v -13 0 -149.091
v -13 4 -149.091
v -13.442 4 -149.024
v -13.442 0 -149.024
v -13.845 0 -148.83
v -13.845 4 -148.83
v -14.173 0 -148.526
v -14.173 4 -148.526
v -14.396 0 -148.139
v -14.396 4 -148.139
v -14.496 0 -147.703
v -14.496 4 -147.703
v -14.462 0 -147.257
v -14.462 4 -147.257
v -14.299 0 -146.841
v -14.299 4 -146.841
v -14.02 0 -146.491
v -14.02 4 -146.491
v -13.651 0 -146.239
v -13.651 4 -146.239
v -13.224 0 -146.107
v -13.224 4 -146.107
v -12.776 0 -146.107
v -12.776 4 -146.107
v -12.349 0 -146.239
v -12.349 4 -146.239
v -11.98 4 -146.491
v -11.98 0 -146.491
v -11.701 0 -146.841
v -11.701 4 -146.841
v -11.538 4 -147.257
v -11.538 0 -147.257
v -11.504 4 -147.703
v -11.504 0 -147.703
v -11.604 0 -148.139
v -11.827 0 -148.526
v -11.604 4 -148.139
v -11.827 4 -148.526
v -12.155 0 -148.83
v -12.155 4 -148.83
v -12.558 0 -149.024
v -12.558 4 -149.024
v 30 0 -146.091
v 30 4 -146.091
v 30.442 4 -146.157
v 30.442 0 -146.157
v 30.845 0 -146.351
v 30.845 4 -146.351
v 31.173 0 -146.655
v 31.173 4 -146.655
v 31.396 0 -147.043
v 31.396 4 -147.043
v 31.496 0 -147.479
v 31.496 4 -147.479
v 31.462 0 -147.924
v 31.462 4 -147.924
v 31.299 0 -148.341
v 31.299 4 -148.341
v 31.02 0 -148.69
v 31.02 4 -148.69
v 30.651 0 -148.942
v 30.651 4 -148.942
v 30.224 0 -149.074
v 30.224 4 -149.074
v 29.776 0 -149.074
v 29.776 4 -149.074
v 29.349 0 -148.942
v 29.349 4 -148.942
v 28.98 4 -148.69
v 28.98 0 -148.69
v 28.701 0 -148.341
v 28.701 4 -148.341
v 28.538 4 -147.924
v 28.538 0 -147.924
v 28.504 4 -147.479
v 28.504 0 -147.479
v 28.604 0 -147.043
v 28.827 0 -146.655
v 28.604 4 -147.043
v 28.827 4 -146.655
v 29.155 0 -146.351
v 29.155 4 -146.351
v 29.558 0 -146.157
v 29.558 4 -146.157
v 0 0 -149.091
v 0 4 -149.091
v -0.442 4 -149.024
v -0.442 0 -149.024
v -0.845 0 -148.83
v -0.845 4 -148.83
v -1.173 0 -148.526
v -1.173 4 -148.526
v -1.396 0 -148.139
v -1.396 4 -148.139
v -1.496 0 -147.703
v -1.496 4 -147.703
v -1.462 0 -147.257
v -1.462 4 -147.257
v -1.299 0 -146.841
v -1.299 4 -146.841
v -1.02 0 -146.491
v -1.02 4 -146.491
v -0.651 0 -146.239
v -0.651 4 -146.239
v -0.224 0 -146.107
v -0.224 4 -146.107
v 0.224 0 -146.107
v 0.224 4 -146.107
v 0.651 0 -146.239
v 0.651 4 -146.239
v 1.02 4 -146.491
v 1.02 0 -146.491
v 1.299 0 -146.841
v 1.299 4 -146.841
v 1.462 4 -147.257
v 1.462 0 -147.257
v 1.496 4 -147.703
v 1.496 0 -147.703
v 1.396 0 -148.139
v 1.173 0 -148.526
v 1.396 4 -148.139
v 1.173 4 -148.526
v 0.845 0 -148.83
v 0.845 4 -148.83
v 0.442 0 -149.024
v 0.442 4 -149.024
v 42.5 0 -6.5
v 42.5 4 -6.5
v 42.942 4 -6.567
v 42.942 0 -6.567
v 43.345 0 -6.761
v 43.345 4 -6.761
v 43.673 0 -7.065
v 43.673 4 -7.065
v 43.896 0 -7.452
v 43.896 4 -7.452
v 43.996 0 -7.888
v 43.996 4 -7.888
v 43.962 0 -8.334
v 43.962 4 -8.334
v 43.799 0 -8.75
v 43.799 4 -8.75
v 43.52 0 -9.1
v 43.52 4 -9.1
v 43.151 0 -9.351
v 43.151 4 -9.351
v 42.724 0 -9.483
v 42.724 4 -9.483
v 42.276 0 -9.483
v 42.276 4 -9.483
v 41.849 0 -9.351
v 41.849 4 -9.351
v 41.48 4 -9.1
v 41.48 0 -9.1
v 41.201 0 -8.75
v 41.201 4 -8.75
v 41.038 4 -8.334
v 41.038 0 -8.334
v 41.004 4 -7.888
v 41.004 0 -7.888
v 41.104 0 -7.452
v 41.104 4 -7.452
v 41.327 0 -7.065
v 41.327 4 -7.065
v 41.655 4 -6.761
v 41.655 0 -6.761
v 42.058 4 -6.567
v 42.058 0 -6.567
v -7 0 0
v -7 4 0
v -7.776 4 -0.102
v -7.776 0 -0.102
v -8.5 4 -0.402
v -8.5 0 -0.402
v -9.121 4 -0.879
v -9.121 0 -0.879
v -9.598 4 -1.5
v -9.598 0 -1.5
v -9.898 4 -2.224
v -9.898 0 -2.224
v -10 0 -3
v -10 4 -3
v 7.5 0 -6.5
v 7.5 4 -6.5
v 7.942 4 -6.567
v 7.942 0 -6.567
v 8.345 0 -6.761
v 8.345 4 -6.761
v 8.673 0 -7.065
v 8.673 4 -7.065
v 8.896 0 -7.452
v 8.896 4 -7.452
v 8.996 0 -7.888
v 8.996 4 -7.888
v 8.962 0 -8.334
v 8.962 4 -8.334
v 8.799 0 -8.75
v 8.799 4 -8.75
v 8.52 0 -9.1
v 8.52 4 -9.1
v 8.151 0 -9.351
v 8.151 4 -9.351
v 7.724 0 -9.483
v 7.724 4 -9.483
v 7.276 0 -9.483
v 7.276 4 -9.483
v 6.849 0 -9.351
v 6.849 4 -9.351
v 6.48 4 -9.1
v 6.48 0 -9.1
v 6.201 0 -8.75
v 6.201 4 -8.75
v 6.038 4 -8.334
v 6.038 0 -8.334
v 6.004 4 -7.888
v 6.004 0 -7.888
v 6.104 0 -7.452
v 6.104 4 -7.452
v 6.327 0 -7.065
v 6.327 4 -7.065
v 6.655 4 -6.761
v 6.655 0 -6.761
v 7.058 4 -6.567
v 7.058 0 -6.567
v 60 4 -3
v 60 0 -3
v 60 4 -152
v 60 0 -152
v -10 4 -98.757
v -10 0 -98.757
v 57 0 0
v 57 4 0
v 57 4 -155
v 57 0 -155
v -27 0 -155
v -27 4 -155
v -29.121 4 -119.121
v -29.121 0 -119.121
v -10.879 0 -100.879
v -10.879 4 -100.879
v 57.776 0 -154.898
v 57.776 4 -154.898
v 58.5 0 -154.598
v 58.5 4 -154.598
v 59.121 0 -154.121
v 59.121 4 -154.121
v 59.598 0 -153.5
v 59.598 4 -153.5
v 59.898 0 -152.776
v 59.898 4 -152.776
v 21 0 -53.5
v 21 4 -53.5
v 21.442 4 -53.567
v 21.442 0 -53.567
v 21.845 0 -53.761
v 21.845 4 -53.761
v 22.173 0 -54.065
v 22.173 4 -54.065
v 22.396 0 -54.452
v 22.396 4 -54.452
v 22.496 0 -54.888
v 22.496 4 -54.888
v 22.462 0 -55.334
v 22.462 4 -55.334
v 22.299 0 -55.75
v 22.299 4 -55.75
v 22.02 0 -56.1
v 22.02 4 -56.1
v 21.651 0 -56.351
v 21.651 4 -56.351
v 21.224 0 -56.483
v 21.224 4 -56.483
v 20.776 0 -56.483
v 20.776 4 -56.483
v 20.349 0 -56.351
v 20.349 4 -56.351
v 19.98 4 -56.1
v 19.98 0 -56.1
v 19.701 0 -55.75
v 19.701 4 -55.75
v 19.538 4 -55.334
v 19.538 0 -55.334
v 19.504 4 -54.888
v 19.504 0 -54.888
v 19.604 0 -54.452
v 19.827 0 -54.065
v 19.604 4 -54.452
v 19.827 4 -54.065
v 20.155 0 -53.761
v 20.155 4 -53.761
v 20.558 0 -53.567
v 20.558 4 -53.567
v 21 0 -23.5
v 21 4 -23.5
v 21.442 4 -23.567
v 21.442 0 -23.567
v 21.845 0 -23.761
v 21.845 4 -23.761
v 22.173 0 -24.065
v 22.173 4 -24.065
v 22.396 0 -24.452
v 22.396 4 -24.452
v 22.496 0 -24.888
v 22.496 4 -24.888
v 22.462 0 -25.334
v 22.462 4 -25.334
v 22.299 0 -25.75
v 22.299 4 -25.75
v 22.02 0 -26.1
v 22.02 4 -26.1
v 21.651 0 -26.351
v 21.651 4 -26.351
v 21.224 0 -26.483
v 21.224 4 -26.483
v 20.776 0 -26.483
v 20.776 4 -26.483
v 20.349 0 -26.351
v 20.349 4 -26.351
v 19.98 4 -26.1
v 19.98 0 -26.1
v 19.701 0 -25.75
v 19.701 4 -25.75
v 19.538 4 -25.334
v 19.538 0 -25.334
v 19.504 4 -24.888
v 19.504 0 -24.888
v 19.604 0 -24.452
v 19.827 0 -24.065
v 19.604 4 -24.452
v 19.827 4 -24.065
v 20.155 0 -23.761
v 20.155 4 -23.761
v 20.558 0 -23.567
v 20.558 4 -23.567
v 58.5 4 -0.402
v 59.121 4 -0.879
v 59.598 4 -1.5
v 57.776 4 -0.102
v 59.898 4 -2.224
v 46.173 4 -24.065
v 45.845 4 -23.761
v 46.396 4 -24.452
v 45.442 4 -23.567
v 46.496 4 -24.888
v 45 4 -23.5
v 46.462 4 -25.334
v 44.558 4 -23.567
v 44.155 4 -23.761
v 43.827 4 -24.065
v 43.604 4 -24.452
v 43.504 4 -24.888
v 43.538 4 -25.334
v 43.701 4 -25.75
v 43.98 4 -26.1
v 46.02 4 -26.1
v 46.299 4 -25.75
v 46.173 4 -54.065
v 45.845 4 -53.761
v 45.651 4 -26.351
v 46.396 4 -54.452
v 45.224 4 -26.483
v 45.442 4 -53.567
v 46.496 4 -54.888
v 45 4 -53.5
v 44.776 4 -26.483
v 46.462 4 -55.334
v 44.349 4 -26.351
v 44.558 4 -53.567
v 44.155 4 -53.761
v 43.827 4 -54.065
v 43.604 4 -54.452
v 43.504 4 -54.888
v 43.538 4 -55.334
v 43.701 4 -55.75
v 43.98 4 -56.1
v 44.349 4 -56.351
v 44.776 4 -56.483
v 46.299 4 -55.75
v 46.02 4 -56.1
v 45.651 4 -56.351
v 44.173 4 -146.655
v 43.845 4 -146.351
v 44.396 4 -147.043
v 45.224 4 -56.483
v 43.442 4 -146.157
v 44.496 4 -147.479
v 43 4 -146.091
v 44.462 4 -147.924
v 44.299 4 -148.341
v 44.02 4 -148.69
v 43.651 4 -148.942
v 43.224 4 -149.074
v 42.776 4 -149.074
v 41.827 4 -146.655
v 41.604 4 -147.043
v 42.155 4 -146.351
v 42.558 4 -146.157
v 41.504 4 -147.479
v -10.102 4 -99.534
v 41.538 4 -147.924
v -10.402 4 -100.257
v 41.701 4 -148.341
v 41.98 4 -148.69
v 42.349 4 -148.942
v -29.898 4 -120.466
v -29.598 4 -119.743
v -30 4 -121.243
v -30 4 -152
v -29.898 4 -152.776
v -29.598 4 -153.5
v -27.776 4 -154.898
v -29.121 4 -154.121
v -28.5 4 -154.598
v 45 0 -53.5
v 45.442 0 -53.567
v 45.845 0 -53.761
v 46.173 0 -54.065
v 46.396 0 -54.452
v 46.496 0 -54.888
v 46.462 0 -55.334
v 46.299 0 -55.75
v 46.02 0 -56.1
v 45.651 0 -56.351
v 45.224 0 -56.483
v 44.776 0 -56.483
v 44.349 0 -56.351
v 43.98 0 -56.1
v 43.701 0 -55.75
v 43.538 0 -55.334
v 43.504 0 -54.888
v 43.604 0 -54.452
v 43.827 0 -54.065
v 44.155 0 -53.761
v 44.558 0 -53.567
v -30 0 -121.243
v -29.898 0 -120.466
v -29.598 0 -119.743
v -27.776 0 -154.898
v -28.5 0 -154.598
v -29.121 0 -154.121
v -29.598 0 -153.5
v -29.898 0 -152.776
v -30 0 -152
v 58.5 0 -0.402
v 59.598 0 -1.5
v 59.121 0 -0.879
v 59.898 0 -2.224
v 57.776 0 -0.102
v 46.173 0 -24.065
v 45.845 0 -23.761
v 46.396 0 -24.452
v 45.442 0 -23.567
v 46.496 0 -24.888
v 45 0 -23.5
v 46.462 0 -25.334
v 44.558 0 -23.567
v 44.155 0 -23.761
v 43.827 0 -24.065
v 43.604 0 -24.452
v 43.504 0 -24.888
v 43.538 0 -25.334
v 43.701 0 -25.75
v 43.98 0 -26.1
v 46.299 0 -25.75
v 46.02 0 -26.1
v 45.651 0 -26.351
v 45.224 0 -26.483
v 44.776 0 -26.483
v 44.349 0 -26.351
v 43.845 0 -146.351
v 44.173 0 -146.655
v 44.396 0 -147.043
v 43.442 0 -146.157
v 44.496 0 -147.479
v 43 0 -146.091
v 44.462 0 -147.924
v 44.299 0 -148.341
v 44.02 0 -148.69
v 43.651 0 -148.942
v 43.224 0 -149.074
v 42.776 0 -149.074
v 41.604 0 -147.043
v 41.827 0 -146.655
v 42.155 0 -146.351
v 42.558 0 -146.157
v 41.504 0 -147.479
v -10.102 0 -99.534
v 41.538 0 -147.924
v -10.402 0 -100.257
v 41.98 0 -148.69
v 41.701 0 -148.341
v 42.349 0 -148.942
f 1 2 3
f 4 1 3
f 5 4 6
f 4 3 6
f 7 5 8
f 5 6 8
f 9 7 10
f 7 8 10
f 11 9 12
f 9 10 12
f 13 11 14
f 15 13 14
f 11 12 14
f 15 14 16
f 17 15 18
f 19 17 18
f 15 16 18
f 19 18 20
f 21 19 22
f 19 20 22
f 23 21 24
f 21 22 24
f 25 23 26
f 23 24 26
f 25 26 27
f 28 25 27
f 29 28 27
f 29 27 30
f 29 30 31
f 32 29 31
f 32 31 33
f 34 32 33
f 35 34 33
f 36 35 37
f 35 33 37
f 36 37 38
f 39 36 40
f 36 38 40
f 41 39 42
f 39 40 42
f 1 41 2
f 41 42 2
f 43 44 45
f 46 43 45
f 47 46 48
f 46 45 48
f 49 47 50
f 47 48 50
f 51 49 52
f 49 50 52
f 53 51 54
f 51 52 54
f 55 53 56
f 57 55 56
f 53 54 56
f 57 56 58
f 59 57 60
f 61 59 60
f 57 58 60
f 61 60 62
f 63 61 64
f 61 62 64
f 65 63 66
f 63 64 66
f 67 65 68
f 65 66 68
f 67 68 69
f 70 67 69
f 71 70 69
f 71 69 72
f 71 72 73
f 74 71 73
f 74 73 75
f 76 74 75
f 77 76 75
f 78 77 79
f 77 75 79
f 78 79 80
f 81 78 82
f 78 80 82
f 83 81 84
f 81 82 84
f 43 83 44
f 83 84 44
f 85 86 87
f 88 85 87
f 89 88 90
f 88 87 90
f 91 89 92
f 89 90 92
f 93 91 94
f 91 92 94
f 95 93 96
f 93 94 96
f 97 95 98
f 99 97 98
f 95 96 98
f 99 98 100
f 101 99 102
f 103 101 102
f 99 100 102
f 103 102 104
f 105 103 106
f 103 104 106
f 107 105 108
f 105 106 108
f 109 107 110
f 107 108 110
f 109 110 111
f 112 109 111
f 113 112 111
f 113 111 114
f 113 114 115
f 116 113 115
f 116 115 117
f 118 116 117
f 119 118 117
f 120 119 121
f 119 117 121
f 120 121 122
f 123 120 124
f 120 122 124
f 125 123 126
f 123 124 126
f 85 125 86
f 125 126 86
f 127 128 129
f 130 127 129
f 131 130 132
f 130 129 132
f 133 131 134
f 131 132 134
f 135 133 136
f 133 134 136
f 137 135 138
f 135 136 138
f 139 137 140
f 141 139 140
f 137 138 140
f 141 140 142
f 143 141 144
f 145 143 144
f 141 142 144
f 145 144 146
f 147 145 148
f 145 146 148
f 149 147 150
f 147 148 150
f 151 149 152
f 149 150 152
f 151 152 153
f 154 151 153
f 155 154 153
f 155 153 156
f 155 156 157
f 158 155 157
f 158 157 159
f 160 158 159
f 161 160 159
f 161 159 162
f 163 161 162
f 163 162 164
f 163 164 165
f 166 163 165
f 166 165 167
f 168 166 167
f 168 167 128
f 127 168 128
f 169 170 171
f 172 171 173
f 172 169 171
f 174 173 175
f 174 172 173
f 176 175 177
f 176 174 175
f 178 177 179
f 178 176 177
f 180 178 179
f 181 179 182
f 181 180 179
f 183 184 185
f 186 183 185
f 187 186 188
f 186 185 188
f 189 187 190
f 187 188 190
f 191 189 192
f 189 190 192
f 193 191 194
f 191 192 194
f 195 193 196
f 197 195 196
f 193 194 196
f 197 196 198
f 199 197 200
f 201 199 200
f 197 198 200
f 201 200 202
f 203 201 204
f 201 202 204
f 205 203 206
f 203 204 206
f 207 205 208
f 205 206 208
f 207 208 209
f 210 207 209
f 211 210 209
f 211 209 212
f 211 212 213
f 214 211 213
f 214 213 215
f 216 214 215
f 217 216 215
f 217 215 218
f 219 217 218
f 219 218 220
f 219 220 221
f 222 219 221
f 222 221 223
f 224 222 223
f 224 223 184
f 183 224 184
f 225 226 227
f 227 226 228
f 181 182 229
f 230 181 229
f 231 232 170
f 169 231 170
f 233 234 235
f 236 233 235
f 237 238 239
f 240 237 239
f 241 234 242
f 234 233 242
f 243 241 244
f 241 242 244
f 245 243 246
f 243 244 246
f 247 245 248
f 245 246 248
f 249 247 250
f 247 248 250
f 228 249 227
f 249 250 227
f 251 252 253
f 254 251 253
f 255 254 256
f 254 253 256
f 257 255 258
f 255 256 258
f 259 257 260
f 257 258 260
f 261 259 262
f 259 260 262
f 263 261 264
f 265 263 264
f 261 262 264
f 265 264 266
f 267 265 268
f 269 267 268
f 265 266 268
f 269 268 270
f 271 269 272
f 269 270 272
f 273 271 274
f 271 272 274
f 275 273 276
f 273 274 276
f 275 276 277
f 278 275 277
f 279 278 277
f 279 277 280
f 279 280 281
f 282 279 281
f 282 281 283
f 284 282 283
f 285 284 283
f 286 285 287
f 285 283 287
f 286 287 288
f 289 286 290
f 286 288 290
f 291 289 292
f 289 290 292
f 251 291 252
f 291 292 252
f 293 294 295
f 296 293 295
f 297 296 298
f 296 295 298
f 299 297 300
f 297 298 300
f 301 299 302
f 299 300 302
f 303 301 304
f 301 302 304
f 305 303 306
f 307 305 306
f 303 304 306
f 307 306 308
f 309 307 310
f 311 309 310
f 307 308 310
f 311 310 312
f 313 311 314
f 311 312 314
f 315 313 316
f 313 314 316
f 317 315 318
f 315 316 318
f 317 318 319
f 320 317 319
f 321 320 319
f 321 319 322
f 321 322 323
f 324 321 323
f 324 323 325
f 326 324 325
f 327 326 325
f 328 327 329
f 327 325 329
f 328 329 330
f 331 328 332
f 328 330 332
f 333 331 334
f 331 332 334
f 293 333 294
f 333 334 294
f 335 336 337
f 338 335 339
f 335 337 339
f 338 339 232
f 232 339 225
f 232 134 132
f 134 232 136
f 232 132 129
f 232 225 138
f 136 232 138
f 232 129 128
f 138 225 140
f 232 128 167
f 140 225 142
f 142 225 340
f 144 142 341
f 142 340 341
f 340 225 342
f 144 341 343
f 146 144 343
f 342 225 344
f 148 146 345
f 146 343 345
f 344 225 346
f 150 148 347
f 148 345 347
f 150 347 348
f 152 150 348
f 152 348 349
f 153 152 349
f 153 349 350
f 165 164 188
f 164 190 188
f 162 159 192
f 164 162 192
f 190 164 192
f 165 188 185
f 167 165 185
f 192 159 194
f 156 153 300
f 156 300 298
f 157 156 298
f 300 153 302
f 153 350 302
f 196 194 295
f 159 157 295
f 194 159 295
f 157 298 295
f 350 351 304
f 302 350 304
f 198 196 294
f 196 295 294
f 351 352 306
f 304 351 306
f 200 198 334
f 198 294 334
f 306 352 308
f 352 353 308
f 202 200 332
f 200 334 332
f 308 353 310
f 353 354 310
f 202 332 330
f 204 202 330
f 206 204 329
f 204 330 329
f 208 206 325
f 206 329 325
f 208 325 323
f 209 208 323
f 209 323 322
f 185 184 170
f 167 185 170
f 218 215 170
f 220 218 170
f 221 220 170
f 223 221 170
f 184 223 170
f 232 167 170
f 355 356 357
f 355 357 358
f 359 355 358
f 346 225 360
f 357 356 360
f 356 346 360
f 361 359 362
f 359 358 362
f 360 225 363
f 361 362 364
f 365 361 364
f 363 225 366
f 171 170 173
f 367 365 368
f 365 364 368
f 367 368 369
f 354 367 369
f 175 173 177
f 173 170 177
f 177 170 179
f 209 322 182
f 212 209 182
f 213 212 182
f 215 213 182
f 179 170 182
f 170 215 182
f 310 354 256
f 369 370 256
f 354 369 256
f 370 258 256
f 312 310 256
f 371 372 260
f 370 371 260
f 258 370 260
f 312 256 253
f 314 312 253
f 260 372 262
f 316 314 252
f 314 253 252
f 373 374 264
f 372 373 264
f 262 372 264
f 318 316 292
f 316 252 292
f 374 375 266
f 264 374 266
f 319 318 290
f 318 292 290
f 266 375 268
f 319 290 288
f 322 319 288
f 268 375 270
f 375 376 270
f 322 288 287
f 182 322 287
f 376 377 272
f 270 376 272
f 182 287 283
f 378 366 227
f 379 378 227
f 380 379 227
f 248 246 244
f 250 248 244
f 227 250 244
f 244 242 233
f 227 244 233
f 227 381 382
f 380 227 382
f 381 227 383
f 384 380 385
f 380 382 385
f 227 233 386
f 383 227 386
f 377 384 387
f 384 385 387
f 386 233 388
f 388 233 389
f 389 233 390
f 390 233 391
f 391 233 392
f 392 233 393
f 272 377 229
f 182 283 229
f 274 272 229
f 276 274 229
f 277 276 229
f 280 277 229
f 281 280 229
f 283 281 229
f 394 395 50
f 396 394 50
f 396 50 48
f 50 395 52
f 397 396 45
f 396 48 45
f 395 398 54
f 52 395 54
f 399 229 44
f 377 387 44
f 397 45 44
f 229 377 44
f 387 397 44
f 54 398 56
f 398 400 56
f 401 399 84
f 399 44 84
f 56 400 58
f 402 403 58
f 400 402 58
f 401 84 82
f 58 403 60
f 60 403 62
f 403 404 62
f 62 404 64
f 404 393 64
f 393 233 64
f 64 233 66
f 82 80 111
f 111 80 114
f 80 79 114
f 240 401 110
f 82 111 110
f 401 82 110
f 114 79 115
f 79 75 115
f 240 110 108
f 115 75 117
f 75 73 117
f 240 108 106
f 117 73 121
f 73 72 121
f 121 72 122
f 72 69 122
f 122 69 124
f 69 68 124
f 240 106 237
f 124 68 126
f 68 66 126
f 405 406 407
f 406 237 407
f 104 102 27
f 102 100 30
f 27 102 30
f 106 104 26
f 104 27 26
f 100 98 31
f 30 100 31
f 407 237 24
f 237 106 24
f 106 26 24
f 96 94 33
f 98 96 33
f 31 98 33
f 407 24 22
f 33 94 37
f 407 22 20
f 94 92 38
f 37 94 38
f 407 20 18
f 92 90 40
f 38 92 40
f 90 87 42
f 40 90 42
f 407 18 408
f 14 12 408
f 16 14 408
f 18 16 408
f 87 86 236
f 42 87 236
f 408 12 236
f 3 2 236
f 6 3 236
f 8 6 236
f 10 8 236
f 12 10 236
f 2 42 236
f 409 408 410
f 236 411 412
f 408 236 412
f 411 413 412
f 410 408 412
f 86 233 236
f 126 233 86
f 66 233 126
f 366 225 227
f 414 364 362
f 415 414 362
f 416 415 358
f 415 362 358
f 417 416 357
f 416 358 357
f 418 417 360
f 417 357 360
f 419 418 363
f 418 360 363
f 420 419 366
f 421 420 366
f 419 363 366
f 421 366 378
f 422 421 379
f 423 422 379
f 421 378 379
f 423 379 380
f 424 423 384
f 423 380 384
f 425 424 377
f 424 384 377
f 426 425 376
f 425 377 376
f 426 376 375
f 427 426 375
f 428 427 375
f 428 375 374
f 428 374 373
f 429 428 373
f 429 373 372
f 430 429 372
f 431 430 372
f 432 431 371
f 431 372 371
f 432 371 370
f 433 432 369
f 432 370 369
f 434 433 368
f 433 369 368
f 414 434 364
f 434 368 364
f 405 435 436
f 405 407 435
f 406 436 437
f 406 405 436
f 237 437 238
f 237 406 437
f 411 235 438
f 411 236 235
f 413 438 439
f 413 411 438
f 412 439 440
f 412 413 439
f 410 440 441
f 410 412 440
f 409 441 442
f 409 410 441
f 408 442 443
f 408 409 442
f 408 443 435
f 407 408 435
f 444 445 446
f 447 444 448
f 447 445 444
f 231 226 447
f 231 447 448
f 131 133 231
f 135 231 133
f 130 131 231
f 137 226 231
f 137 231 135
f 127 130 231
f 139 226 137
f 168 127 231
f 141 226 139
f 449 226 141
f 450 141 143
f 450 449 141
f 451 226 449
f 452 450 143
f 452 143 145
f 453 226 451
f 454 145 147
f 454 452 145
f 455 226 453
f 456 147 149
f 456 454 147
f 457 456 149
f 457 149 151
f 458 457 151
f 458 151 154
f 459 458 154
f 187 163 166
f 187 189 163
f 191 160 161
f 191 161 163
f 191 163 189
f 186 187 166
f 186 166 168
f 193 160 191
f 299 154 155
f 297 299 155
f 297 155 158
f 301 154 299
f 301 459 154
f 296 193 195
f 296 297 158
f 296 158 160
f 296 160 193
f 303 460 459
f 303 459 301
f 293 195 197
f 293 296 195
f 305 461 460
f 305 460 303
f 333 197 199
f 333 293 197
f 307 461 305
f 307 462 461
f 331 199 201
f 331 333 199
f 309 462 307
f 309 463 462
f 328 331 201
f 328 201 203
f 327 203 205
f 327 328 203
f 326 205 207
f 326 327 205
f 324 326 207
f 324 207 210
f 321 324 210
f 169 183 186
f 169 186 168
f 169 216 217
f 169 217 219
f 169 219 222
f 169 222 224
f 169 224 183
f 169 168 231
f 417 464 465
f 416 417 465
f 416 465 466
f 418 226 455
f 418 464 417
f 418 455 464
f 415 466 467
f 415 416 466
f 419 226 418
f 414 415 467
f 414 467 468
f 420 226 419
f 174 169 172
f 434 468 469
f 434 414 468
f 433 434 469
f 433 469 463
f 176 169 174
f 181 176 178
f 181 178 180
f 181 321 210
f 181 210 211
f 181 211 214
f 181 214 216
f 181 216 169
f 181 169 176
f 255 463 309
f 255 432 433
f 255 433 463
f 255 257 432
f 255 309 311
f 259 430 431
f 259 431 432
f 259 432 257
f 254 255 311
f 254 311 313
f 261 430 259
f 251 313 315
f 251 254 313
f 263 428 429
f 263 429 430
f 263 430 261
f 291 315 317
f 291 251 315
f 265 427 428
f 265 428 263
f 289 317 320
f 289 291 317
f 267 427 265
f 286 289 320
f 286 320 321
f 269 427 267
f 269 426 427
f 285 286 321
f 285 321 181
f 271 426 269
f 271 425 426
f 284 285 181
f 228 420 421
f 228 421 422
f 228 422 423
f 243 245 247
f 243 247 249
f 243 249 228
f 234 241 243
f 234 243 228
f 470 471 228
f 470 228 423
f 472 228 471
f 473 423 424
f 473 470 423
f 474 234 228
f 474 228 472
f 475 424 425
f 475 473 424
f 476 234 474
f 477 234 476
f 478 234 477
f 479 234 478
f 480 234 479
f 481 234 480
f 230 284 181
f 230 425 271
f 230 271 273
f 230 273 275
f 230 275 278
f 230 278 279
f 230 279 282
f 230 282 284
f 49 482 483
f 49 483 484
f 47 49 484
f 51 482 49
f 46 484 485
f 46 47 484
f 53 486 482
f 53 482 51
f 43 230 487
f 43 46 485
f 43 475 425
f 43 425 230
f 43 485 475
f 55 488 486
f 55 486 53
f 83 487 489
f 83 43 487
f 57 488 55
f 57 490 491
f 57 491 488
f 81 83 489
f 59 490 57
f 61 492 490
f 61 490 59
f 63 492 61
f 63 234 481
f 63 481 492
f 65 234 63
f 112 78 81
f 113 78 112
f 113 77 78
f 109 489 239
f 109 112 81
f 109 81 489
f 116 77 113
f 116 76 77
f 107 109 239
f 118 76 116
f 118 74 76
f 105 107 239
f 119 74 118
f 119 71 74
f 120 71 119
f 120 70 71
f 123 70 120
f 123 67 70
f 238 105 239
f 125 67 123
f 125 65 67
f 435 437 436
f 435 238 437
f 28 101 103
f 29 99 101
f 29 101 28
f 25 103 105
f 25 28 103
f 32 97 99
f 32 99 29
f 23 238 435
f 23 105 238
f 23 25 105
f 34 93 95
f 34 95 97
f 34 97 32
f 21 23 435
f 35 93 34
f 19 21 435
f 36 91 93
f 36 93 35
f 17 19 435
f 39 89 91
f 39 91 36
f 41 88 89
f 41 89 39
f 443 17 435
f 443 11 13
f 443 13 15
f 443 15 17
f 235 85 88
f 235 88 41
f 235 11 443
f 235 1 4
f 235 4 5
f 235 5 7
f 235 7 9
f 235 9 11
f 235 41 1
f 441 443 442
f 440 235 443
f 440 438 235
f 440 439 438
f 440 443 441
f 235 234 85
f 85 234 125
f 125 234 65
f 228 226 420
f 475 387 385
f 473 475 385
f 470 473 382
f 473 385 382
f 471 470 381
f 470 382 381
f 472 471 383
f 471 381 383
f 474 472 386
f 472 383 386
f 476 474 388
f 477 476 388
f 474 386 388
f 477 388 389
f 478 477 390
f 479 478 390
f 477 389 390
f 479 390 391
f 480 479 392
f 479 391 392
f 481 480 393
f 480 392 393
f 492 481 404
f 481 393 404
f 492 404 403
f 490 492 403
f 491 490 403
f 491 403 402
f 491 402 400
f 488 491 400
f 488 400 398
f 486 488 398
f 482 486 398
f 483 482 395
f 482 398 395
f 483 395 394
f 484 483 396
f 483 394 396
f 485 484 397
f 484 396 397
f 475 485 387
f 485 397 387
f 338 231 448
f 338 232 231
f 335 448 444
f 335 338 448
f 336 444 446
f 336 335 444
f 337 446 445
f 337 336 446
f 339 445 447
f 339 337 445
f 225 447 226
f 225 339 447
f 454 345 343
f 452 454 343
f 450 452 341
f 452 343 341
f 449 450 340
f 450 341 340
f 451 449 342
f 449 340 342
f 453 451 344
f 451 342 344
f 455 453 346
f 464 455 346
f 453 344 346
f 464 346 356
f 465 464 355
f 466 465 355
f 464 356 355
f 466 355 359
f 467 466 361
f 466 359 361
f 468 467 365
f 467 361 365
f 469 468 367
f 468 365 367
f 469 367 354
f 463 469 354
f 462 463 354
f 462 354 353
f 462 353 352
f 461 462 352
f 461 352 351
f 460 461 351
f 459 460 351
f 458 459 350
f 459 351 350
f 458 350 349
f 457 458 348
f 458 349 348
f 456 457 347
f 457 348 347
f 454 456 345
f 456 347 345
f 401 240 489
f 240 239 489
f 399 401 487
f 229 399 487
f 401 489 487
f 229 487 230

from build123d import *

# Parameters (mm, degrees)
EXTRUDE_1_DEPTH     = 4
SKETCH_2_R          = 1.5
CUT_EXTRUDE_1_DEPTH = 4
SKETCH_3_R          = 1.5
CUT_EXTRUDE_2_DEPTH = 4
EXTRUDE_2_DEPTH     = 4
FILLET_2_R          = 3
SKETCH_6_R          = 1.5
CUT_EXTRUDE_3_DEPTH = 167.255826966


with BuildPart() as part:
    # 草图1 → 凸台-拉伸1 (new body)
    with BuildSketch(Plane(origin=(0, 0, 0), x_dir=(1, 0, 0), z_dir=(0, 1, 0))):
        Polygon((0, 0), (60, 0), (60, 155), (-30, 155), (-30, 120), (0, 90), align=None)
    extrude(amount=EXTRUDE_1_DEPTH)

    # 草图2 → 切除-拉伸1 (cut)
    with BuildSketch(Plane(origin=(0, 4, 0), x_dir=(1, 0, 0), z_dir=(0, 1, 0))):
        with Locations(Location((45, 25, 0), (0, 0, 270))):
            Circle(SKETCH_2_R)
        with Locations(Location((21, 25, 0), (0, 0, 270))):
            Circle(SKETCH_2_R)
        with Locations(Location((45, 55, 0), (0, 0, 270))):
            Circle(SKETCH_2_R)
        with Locations(Location((21, 55, 0), (0, 0, 270))):
            Circle(SKETCH_2_R)
    extrude(amount=-CUT_EXTRUDE_1_DEPTH, mode=Mode.SUBTRACT)

    # 草图3 → 切除-拉伸2 (cut)
    with BuildSketch(Plane(origin=(0, 4, 0), x_dir=(1, 0, 0), z_dir=(0, 1, 0))):
        with Locations(Location((30, 147.590674679, 0), (0, 0, 270))):
            Circle(SKETCH_3_R)
        with Locations(Location((43, 147.590674679, 0), (0, 0, 270))):
            Circle(SKETCH_3_R)
        with Locations(Location((-13, 147.590674679, 0), (0, 0, 90))):
            Circle(SKETCH_3_R)
        with Locations(Location((0, 147.590674679, 0), (0, 0, 90))):
            Circle(SKETCH_3_R)
    extrude(amount=-CUT_EXTRUDE_2_DEPTH, mode=Mode.SUBTRACT)

    # 草图5 → 凸台-拉伸2 (add)
    with BuildSketch(Plane(origin=(0, 4, 0), x_dir=(1, 0, 0), z_dir=(0, 1, 0))):
        Polygon((0, 0), (-10, 0), (-10, 100), (0, 90), align=None)
    extrude(amount=-EXTRUDE_2_DEPTH)

    # 圆角2
    fillet_2_edges = [part.edges().sort_by_distance(p)[0] for p in [
        (-30, 2, -120),
        (-30, 2, -155),
        (60, 2, -155),
        (60, 2, 0),
        (-10, 2, 0),
        (-10, 2, -100),
    ]]
    fillet(fillet_2_edges, radius=FILLET_2_R)

    # 草图6 → 切除-拉伸3 (cut, through all)
    with BuildSketch(Plane(origin=(0, 4, 0), x_dir=(1, 0, 0), z_dir=(0, 1, 0))):
        with Locations(Location((7.5, 8, 0), (0, 0, 270))):
            Circle(SKETCH_6_R)
        with Locations(Location((42.5, 8, 0), (0, 0, 270))):
            Circle(SKETCH_6_R)
    extrude(amount=-CUT_EXTRUDE_3_DEPTH, mode=Mode.SUBTRACT)


solid = part.part
